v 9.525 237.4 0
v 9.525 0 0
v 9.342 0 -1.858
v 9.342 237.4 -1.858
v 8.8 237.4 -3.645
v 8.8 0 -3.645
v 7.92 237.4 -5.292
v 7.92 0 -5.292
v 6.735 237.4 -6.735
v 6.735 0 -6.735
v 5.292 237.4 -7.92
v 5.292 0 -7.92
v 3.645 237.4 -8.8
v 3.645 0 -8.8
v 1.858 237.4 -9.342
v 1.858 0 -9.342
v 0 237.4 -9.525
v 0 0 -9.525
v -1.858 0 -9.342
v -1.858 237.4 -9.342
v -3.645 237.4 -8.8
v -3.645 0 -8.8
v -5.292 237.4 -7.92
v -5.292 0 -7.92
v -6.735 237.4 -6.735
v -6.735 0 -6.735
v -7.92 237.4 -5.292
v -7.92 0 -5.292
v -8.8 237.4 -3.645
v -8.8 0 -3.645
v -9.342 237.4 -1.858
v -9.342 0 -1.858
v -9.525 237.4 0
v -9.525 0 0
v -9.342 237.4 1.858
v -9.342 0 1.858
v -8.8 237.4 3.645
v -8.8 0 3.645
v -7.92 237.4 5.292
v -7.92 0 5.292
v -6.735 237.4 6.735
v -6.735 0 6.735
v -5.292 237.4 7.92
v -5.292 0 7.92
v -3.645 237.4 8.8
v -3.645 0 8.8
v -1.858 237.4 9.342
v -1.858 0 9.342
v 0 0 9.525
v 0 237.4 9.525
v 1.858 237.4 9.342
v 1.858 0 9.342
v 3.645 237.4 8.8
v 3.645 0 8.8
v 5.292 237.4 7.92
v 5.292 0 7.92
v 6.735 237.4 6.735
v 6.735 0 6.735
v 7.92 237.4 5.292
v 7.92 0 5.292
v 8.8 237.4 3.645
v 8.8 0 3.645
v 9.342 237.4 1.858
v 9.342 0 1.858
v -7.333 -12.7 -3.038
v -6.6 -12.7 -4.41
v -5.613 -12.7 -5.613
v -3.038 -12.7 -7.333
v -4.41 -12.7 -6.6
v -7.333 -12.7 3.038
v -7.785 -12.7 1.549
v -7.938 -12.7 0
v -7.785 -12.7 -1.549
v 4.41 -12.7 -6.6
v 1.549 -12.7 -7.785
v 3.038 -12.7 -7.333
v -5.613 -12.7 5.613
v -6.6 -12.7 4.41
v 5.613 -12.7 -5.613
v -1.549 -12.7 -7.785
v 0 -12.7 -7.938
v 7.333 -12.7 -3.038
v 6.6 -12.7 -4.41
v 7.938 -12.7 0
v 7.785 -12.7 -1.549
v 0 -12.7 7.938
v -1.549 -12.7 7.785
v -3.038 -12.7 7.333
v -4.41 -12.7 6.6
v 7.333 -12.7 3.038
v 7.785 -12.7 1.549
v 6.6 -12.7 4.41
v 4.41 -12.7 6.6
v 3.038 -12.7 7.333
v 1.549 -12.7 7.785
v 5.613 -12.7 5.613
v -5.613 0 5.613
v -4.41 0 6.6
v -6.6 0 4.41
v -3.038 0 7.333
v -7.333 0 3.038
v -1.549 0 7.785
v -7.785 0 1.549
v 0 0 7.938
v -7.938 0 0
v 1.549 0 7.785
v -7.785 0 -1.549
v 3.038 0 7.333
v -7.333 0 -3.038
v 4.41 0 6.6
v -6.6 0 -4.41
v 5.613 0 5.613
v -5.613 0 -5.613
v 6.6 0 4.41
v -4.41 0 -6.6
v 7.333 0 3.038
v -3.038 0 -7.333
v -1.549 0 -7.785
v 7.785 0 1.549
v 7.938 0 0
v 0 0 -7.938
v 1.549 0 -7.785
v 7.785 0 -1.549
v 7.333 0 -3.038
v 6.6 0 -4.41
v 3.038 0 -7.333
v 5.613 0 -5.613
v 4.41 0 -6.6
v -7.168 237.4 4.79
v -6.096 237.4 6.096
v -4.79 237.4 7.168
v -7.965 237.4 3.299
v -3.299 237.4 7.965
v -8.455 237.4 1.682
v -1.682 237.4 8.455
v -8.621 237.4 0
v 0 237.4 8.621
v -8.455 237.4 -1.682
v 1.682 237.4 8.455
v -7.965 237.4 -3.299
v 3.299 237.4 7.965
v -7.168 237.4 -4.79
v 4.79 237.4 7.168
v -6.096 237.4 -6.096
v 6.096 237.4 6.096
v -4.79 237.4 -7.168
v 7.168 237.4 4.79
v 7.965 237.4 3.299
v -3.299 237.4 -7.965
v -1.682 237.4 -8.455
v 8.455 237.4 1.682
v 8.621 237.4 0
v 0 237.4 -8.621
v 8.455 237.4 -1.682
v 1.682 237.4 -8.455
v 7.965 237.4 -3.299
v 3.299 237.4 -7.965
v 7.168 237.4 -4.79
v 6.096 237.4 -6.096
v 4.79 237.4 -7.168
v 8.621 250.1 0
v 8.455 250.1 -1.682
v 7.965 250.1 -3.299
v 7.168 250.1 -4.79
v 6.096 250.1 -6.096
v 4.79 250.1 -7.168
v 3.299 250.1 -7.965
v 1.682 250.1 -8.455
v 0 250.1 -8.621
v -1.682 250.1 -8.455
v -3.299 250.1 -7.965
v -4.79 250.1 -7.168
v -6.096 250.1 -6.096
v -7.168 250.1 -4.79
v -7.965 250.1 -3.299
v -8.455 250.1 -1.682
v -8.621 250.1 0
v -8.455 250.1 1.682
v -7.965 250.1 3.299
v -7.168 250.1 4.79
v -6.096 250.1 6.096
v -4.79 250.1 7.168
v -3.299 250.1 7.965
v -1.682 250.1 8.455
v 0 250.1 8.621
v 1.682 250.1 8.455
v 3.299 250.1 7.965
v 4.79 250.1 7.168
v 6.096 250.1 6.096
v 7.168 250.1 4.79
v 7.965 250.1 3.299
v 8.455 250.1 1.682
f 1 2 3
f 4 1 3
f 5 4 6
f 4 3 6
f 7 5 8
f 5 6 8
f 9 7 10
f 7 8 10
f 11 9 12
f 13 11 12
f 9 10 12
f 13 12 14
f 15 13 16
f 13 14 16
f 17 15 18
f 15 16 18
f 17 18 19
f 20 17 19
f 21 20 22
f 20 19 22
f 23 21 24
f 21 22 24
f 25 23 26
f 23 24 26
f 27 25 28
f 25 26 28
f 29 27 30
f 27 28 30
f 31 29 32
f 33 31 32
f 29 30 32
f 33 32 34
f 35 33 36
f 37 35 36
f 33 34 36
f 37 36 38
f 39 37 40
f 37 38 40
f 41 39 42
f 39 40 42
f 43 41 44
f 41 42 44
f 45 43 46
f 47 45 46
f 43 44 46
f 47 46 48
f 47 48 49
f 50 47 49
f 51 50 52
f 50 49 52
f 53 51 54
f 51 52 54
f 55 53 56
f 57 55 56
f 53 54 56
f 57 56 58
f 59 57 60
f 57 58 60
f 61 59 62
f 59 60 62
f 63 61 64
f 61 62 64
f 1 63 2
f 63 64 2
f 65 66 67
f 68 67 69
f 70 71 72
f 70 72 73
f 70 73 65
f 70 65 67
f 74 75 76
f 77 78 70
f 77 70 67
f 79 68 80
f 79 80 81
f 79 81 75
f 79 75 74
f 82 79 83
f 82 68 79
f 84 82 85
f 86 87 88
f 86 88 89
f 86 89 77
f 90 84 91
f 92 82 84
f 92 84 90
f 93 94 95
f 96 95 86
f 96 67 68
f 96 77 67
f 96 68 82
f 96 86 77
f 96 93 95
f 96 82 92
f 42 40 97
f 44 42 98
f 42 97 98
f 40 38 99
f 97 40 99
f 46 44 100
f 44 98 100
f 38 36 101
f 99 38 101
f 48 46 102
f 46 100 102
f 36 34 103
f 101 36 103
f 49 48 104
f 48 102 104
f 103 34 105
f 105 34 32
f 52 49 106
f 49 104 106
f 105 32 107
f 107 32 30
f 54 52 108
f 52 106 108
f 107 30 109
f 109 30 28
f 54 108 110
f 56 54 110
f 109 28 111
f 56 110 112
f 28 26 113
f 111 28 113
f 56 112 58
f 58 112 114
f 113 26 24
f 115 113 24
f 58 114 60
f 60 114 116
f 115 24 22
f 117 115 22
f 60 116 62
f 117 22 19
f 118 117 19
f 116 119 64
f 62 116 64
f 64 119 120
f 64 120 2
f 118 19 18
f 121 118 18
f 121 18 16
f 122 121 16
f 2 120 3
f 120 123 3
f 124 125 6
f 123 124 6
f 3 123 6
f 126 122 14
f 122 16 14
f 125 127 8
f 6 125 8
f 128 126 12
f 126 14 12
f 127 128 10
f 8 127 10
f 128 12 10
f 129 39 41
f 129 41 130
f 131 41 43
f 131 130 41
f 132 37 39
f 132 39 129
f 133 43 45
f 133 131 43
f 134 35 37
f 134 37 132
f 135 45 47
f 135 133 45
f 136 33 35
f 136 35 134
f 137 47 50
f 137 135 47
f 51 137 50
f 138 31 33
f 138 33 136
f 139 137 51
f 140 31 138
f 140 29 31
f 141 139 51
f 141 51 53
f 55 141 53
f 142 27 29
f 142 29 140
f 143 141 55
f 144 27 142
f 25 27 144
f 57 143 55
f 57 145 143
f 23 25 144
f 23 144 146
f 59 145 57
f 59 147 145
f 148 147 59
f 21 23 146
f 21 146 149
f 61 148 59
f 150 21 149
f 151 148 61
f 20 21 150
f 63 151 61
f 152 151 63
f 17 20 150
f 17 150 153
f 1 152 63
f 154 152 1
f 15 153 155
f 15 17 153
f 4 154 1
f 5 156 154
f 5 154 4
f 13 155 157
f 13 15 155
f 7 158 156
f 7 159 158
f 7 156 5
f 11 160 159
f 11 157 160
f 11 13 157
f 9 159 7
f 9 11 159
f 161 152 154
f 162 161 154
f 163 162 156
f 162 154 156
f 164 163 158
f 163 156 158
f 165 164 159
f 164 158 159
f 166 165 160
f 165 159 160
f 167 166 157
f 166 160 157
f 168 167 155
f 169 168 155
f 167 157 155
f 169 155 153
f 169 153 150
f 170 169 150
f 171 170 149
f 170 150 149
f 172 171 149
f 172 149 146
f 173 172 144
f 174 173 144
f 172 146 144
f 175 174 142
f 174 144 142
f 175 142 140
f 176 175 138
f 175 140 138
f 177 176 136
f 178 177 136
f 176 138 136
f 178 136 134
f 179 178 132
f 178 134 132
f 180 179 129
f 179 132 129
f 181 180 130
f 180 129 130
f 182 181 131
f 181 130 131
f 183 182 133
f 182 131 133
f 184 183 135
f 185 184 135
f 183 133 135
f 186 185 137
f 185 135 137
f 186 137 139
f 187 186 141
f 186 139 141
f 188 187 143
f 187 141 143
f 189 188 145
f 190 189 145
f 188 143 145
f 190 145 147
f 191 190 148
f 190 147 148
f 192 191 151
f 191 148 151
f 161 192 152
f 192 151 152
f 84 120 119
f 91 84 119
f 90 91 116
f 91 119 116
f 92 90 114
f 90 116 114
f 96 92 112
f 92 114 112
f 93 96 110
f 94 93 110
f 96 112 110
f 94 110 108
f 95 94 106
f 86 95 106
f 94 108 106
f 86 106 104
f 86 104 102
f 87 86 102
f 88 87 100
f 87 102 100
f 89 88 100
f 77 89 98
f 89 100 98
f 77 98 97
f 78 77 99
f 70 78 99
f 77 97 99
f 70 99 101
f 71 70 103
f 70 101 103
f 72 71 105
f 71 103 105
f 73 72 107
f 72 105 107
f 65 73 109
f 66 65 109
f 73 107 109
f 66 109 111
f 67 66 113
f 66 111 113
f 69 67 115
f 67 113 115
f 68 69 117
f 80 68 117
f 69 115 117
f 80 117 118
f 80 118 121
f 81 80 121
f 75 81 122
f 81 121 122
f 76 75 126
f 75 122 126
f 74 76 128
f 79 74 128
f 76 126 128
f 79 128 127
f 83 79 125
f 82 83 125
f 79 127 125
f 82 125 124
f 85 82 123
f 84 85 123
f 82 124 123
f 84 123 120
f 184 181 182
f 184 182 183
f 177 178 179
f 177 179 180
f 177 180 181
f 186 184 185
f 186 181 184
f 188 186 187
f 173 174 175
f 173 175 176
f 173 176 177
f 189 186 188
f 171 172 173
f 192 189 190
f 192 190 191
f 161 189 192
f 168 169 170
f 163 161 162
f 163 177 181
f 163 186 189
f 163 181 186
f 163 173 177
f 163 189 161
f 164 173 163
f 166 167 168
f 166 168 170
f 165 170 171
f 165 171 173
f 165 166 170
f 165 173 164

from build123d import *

# Parameters (mm, degrees)
SKETCH2_R           = 9.525
BOSS_EXTRUDE1_DEPTH = 237.399999964
SKETCH3_R           = 8.621005773
BOSS_EXTRUDE2_DEPTH = 12.7
SKETCH4_R           = 7.9375
BOSS_EXTRUDE3_DEPTH = 12.7


with BuildPart() as part:
    # Sketch2 → Boss-Extrude1 (new body)
    with BuildSketch(Plane(origin=(0, 0, 0), x_dir=(1, 0, 0), z_dir=(0, 1, 0))):
        Circle(SKETCH2_R)
    extrude(amount=BOSS_EXTRUDE1_DEPTH)

    # Sketch3 → Boss-Extrude2 (add)
    with BuildSketch(Plane(origin=(0, 237.399999964, 0), x_dir=(1, 0, 0), z_dir=(0, 1, 0))):
        Circle(SKETCH3_R)
    extrude(amount=BOSS_EXTRUDE2_DEPTH)

    # Sketch4 → Boss-Extrude3 (add)
    with BuildSketch(Plane.XZ):
        Circle(SKETCH4_R)
    extrude(amount=BOSS_EXTRUDE3_DEPTH)


solid = part.part
